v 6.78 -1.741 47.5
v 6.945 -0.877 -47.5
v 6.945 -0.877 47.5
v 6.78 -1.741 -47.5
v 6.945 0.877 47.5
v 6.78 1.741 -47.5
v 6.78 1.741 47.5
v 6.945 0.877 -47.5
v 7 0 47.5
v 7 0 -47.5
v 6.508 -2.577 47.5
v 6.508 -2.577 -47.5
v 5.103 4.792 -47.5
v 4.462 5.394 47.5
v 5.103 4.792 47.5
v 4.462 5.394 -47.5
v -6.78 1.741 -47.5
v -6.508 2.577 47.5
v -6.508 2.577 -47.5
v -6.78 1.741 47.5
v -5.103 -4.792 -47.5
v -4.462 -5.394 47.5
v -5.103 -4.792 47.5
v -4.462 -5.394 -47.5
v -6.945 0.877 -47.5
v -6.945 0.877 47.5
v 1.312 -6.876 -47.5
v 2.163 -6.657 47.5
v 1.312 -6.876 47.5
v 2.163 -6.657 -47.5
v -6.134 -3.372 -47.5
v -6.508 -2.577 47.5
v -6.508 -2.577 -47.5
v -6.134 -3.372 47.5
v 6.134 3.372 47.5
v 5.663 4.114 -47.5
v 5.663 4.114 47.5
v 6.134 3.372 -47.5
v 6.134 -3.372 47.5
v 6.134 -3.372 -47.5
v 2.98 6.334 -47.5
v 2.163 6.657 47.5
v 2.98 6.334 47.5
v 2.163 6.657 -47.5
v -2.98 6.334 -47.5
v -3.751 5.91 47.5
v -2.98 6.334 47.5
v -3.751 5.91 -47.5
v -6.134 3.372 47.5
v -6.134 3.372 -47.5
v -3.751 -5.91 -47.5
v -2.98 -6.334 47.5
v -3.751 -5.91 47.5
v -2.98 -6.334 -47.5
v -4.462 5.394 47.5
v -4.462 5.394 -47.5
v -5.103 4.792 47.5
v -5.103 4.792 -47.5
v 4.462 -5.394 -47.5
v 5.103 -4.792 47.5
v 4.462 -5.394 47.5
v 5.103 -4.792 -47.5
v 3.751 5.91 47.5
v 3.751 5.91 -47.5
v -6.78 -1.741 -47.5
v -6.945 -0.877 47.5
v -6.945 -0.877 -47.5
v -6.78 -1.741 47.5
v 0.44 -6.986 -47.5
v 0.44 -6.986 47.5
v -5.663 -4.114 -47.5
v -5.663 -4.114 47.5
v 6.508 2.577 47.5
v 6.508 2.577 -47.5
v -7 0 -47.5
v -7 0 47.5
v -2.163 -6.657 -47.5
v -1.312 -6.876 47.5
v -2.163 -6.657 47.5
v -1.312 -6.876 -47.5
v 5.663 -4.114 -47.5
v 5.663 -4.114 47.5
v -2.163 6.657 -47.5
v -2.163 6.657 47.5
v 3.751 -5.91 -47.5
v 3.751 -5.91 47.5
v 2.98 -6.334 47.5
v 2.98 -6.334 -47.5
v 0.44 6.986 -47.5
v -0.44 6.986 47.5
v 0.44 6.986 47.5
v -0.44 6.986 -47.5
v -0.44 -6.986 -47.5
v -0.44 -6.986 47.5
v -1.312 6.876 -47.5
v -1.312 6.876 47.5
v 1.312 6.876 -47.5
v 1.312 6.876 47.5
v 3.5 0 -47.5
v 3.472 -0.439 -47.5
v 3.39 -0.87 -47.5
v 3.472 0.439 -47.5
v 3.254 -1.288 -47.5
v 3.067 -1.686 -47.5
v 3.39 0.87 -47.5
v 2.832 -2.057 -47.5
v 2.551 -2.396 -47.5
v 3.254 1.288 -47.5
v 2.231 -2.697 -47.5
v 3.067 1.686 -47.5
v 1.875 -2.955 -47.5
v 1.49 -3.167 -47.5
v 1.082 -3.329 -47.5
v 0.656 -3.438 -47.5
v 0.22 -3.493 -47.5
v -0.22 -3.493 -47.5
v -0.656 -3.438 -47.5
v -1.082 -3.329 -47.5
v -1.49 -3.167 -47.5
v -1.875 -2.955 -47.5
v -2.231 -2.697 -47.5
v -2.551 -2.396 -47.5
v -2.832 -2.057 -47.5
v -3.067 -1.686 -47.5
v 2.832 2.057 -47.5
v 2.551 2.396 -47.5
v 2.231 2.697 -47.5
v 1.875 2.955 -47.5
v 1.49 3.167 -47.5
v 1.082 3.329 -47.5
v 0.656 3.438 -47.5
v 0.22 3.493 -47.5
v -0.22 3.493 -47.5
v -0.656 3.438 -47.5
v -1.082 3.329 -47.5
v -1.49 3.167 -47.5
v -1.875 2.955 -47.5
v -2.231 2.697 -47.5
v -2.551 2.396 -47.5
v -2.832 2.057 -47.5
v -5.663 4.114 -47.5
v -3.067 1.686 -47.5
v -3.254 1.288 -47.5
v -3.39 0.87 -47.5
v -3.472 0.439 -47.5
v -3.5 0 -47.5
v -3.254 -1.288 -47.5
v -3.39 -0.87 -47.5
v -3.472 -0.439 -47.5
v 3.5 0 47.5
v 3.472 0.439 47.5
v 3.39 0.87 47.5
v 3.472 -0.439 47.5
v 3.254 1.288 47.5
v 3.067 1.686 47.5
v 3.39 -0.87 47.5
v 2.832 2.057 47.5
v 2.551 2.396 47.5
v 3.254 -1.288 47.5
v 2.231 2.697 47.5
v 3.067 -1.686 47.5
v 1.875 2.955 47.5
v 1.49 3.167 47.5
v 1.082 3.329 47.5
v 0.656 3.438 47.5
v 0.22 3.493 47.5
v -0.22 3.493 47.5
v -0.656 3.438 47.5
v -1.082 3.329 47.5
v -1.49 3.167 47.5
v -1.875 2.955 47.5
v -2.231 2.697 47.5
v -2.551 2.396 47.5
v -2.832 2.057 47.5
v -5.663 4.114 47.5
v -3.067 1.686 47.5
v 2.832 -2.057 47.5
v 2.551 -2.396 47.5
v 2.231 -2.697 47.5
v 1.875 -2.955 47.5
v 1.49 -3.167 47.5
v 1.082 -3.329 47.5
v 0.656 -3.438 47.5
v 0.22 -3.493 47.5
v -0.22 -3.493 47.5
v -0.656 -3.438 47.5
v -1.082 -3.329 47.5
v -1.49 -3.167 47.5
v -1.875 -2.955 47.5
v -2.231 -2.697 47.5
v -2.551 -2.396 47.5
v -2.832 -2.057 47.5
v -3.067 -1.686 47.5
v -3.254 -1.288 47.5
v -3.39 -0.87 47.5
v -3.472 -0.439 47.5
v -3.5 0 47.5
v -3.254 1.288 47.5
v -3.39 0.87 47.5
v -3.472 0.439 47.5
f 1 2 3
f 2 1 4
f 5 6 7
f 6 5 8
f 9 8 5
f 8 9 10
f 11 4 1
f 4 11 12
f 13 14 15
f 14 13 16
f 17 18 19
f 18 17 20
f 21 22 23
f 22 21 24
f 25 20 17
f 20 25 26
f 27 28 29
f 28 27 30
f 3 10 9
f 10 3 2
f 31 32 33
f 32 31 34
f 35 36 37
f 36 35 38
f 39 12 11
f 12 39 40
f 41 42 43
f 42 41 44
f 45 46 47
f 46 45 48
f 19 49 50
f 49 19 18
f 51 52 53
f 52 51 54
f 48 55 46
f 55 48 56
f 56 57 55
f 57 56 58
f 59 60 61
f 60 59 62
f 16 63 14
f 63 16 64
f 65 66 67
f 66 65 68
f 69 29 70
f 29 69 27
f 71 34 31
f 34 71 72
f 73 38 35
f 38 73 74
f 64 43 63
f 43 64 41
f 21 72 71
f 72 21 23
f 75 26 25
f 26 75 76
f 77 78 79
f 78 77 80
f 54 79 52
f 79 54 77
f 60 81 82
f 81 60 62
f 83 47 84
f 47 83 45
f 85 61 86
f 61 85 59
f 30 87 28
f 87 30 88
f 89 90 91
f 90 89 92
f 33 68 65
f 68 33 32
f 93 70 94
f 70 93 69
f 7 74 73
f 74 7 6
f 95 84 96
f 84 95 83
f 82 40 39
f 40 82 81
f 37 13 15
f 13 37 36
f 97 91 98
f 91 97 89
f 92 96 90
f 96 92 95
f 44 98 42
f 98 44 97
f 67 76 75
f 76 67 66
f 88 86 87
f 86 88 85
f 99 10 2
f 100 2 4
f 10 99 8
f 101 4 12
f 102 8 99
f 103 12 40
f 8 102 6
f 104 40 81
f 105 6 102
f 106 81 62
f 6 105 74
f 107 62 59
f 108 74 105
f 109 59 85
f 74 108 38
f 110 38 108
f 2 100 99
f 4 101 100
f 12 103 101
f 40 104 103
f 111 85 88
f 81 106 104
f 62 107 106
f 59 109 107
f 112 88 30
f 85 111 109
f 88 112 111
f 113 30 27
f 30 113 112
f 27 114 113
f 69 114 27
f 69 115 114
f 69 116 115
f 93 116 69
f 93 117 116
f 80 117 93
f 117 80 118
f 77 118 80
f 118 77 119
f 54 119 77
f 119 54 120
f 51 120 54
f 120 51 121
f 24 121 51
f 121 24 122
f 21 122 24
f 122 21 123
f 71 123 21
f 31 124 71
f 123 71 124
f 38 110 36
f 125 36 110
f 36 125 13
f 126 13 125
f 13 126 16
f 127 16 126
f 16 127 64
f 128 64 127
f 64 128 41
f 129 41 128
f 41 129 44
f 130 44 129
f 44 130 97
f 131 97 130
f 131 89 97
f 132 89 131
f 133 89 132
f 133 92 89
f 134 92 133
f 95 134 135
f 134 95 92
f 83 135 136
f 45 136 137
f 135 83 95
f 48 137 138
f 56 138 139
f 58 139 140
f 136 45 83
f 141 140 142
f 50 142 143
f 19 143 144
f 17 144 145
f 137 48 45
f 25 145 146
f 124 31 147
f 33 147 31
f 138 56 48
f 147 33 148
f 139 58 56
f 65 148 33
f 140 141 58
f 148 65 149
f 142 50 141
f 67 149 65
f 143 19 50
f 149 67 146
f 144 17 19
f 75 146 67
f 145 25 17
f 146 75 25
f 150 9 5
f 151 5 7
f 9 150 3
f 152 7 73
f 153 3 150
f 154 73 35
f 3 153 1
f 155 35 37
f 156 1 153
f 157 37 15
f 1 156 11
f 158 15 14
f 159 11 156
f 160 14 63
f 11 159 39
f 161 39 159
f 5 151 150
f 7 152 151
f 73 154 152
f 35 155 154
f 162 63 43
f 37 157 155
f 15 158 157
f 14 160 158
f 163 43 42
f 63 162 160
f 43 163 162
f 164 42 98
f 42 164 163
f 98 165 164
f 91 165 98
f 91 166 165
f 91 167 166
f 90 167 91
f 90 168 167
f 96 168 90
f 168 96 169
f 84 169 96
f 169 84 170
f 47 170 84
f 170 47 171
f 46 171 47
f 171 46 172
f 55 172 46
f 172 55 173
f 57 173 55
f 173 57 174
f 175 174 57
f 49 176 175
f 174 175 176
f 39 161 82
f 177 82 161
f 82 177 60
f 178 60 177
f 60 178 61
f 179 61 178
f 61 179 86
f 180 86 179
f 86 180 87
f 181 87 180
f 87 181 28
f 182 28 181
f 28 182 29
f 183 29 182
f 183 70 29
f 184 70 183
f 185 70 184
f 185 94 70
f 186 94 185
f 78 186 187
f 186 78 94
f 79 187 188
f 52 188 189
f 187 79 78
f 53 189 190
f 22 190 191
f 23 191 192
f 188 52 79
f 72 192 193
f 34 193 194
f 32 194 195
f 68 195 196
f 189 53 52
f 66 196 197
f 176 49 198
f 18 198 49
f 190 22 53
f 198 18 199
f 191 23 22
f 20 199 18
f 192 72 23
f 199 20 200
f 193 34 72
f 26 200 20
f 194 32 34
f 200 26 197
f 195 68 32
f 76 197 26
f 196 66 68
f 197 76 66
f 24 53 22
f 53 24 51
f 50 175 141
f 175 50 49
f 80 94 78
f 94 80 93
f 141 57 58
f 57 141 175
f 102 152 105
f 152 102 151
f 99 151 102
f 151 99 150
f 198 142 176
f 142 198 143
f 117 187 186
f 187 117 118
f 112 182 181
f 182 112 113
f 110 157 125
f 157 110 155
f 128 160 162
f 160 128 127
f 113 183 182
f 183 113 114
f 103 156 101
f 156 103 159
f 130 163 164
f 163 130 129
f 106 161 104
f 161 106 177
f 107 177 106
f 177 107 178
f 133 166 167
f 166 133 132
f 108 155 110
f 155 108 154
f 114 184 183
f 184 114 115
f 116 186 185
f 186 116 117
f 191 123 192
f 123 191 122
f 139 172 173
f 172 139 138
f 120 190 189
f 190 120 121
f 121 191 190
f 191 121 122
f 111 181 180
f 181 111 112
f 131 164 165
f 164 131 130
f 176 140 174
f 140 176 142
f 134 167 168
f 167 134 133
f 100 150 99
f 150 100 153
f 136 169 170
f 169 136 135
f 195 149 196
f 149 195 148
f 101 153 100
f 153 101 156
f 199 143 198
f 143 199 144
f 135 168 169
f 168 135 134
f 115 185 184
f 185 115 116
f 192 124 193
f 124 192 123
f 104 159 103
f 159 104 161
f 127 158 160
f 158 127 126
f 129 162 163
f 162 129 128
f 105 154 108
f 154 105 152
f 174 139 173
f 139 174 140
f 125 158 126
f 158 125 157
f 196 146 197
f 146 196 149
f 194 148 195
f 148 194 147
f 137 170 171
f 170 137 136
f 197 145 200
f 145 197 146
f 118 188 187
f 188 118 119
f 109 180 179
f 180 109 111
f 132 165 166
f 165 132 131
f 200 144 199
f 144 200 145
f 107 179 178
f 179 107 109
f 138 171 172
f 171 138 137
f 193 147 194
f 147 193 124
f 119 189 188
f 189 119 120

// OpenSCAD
$fn = 50;


difference() {
	union() {
		translate(v = [0, 0, -47.5000000000]) {
			cylinder(h = 95, r = 7.0000000000);
		}
	}
	union() {
		translate(v = [0, 0, -100.0000000000]) {
			cylinder(h = 200, r = 3.5000000000);
		}
	}
}
